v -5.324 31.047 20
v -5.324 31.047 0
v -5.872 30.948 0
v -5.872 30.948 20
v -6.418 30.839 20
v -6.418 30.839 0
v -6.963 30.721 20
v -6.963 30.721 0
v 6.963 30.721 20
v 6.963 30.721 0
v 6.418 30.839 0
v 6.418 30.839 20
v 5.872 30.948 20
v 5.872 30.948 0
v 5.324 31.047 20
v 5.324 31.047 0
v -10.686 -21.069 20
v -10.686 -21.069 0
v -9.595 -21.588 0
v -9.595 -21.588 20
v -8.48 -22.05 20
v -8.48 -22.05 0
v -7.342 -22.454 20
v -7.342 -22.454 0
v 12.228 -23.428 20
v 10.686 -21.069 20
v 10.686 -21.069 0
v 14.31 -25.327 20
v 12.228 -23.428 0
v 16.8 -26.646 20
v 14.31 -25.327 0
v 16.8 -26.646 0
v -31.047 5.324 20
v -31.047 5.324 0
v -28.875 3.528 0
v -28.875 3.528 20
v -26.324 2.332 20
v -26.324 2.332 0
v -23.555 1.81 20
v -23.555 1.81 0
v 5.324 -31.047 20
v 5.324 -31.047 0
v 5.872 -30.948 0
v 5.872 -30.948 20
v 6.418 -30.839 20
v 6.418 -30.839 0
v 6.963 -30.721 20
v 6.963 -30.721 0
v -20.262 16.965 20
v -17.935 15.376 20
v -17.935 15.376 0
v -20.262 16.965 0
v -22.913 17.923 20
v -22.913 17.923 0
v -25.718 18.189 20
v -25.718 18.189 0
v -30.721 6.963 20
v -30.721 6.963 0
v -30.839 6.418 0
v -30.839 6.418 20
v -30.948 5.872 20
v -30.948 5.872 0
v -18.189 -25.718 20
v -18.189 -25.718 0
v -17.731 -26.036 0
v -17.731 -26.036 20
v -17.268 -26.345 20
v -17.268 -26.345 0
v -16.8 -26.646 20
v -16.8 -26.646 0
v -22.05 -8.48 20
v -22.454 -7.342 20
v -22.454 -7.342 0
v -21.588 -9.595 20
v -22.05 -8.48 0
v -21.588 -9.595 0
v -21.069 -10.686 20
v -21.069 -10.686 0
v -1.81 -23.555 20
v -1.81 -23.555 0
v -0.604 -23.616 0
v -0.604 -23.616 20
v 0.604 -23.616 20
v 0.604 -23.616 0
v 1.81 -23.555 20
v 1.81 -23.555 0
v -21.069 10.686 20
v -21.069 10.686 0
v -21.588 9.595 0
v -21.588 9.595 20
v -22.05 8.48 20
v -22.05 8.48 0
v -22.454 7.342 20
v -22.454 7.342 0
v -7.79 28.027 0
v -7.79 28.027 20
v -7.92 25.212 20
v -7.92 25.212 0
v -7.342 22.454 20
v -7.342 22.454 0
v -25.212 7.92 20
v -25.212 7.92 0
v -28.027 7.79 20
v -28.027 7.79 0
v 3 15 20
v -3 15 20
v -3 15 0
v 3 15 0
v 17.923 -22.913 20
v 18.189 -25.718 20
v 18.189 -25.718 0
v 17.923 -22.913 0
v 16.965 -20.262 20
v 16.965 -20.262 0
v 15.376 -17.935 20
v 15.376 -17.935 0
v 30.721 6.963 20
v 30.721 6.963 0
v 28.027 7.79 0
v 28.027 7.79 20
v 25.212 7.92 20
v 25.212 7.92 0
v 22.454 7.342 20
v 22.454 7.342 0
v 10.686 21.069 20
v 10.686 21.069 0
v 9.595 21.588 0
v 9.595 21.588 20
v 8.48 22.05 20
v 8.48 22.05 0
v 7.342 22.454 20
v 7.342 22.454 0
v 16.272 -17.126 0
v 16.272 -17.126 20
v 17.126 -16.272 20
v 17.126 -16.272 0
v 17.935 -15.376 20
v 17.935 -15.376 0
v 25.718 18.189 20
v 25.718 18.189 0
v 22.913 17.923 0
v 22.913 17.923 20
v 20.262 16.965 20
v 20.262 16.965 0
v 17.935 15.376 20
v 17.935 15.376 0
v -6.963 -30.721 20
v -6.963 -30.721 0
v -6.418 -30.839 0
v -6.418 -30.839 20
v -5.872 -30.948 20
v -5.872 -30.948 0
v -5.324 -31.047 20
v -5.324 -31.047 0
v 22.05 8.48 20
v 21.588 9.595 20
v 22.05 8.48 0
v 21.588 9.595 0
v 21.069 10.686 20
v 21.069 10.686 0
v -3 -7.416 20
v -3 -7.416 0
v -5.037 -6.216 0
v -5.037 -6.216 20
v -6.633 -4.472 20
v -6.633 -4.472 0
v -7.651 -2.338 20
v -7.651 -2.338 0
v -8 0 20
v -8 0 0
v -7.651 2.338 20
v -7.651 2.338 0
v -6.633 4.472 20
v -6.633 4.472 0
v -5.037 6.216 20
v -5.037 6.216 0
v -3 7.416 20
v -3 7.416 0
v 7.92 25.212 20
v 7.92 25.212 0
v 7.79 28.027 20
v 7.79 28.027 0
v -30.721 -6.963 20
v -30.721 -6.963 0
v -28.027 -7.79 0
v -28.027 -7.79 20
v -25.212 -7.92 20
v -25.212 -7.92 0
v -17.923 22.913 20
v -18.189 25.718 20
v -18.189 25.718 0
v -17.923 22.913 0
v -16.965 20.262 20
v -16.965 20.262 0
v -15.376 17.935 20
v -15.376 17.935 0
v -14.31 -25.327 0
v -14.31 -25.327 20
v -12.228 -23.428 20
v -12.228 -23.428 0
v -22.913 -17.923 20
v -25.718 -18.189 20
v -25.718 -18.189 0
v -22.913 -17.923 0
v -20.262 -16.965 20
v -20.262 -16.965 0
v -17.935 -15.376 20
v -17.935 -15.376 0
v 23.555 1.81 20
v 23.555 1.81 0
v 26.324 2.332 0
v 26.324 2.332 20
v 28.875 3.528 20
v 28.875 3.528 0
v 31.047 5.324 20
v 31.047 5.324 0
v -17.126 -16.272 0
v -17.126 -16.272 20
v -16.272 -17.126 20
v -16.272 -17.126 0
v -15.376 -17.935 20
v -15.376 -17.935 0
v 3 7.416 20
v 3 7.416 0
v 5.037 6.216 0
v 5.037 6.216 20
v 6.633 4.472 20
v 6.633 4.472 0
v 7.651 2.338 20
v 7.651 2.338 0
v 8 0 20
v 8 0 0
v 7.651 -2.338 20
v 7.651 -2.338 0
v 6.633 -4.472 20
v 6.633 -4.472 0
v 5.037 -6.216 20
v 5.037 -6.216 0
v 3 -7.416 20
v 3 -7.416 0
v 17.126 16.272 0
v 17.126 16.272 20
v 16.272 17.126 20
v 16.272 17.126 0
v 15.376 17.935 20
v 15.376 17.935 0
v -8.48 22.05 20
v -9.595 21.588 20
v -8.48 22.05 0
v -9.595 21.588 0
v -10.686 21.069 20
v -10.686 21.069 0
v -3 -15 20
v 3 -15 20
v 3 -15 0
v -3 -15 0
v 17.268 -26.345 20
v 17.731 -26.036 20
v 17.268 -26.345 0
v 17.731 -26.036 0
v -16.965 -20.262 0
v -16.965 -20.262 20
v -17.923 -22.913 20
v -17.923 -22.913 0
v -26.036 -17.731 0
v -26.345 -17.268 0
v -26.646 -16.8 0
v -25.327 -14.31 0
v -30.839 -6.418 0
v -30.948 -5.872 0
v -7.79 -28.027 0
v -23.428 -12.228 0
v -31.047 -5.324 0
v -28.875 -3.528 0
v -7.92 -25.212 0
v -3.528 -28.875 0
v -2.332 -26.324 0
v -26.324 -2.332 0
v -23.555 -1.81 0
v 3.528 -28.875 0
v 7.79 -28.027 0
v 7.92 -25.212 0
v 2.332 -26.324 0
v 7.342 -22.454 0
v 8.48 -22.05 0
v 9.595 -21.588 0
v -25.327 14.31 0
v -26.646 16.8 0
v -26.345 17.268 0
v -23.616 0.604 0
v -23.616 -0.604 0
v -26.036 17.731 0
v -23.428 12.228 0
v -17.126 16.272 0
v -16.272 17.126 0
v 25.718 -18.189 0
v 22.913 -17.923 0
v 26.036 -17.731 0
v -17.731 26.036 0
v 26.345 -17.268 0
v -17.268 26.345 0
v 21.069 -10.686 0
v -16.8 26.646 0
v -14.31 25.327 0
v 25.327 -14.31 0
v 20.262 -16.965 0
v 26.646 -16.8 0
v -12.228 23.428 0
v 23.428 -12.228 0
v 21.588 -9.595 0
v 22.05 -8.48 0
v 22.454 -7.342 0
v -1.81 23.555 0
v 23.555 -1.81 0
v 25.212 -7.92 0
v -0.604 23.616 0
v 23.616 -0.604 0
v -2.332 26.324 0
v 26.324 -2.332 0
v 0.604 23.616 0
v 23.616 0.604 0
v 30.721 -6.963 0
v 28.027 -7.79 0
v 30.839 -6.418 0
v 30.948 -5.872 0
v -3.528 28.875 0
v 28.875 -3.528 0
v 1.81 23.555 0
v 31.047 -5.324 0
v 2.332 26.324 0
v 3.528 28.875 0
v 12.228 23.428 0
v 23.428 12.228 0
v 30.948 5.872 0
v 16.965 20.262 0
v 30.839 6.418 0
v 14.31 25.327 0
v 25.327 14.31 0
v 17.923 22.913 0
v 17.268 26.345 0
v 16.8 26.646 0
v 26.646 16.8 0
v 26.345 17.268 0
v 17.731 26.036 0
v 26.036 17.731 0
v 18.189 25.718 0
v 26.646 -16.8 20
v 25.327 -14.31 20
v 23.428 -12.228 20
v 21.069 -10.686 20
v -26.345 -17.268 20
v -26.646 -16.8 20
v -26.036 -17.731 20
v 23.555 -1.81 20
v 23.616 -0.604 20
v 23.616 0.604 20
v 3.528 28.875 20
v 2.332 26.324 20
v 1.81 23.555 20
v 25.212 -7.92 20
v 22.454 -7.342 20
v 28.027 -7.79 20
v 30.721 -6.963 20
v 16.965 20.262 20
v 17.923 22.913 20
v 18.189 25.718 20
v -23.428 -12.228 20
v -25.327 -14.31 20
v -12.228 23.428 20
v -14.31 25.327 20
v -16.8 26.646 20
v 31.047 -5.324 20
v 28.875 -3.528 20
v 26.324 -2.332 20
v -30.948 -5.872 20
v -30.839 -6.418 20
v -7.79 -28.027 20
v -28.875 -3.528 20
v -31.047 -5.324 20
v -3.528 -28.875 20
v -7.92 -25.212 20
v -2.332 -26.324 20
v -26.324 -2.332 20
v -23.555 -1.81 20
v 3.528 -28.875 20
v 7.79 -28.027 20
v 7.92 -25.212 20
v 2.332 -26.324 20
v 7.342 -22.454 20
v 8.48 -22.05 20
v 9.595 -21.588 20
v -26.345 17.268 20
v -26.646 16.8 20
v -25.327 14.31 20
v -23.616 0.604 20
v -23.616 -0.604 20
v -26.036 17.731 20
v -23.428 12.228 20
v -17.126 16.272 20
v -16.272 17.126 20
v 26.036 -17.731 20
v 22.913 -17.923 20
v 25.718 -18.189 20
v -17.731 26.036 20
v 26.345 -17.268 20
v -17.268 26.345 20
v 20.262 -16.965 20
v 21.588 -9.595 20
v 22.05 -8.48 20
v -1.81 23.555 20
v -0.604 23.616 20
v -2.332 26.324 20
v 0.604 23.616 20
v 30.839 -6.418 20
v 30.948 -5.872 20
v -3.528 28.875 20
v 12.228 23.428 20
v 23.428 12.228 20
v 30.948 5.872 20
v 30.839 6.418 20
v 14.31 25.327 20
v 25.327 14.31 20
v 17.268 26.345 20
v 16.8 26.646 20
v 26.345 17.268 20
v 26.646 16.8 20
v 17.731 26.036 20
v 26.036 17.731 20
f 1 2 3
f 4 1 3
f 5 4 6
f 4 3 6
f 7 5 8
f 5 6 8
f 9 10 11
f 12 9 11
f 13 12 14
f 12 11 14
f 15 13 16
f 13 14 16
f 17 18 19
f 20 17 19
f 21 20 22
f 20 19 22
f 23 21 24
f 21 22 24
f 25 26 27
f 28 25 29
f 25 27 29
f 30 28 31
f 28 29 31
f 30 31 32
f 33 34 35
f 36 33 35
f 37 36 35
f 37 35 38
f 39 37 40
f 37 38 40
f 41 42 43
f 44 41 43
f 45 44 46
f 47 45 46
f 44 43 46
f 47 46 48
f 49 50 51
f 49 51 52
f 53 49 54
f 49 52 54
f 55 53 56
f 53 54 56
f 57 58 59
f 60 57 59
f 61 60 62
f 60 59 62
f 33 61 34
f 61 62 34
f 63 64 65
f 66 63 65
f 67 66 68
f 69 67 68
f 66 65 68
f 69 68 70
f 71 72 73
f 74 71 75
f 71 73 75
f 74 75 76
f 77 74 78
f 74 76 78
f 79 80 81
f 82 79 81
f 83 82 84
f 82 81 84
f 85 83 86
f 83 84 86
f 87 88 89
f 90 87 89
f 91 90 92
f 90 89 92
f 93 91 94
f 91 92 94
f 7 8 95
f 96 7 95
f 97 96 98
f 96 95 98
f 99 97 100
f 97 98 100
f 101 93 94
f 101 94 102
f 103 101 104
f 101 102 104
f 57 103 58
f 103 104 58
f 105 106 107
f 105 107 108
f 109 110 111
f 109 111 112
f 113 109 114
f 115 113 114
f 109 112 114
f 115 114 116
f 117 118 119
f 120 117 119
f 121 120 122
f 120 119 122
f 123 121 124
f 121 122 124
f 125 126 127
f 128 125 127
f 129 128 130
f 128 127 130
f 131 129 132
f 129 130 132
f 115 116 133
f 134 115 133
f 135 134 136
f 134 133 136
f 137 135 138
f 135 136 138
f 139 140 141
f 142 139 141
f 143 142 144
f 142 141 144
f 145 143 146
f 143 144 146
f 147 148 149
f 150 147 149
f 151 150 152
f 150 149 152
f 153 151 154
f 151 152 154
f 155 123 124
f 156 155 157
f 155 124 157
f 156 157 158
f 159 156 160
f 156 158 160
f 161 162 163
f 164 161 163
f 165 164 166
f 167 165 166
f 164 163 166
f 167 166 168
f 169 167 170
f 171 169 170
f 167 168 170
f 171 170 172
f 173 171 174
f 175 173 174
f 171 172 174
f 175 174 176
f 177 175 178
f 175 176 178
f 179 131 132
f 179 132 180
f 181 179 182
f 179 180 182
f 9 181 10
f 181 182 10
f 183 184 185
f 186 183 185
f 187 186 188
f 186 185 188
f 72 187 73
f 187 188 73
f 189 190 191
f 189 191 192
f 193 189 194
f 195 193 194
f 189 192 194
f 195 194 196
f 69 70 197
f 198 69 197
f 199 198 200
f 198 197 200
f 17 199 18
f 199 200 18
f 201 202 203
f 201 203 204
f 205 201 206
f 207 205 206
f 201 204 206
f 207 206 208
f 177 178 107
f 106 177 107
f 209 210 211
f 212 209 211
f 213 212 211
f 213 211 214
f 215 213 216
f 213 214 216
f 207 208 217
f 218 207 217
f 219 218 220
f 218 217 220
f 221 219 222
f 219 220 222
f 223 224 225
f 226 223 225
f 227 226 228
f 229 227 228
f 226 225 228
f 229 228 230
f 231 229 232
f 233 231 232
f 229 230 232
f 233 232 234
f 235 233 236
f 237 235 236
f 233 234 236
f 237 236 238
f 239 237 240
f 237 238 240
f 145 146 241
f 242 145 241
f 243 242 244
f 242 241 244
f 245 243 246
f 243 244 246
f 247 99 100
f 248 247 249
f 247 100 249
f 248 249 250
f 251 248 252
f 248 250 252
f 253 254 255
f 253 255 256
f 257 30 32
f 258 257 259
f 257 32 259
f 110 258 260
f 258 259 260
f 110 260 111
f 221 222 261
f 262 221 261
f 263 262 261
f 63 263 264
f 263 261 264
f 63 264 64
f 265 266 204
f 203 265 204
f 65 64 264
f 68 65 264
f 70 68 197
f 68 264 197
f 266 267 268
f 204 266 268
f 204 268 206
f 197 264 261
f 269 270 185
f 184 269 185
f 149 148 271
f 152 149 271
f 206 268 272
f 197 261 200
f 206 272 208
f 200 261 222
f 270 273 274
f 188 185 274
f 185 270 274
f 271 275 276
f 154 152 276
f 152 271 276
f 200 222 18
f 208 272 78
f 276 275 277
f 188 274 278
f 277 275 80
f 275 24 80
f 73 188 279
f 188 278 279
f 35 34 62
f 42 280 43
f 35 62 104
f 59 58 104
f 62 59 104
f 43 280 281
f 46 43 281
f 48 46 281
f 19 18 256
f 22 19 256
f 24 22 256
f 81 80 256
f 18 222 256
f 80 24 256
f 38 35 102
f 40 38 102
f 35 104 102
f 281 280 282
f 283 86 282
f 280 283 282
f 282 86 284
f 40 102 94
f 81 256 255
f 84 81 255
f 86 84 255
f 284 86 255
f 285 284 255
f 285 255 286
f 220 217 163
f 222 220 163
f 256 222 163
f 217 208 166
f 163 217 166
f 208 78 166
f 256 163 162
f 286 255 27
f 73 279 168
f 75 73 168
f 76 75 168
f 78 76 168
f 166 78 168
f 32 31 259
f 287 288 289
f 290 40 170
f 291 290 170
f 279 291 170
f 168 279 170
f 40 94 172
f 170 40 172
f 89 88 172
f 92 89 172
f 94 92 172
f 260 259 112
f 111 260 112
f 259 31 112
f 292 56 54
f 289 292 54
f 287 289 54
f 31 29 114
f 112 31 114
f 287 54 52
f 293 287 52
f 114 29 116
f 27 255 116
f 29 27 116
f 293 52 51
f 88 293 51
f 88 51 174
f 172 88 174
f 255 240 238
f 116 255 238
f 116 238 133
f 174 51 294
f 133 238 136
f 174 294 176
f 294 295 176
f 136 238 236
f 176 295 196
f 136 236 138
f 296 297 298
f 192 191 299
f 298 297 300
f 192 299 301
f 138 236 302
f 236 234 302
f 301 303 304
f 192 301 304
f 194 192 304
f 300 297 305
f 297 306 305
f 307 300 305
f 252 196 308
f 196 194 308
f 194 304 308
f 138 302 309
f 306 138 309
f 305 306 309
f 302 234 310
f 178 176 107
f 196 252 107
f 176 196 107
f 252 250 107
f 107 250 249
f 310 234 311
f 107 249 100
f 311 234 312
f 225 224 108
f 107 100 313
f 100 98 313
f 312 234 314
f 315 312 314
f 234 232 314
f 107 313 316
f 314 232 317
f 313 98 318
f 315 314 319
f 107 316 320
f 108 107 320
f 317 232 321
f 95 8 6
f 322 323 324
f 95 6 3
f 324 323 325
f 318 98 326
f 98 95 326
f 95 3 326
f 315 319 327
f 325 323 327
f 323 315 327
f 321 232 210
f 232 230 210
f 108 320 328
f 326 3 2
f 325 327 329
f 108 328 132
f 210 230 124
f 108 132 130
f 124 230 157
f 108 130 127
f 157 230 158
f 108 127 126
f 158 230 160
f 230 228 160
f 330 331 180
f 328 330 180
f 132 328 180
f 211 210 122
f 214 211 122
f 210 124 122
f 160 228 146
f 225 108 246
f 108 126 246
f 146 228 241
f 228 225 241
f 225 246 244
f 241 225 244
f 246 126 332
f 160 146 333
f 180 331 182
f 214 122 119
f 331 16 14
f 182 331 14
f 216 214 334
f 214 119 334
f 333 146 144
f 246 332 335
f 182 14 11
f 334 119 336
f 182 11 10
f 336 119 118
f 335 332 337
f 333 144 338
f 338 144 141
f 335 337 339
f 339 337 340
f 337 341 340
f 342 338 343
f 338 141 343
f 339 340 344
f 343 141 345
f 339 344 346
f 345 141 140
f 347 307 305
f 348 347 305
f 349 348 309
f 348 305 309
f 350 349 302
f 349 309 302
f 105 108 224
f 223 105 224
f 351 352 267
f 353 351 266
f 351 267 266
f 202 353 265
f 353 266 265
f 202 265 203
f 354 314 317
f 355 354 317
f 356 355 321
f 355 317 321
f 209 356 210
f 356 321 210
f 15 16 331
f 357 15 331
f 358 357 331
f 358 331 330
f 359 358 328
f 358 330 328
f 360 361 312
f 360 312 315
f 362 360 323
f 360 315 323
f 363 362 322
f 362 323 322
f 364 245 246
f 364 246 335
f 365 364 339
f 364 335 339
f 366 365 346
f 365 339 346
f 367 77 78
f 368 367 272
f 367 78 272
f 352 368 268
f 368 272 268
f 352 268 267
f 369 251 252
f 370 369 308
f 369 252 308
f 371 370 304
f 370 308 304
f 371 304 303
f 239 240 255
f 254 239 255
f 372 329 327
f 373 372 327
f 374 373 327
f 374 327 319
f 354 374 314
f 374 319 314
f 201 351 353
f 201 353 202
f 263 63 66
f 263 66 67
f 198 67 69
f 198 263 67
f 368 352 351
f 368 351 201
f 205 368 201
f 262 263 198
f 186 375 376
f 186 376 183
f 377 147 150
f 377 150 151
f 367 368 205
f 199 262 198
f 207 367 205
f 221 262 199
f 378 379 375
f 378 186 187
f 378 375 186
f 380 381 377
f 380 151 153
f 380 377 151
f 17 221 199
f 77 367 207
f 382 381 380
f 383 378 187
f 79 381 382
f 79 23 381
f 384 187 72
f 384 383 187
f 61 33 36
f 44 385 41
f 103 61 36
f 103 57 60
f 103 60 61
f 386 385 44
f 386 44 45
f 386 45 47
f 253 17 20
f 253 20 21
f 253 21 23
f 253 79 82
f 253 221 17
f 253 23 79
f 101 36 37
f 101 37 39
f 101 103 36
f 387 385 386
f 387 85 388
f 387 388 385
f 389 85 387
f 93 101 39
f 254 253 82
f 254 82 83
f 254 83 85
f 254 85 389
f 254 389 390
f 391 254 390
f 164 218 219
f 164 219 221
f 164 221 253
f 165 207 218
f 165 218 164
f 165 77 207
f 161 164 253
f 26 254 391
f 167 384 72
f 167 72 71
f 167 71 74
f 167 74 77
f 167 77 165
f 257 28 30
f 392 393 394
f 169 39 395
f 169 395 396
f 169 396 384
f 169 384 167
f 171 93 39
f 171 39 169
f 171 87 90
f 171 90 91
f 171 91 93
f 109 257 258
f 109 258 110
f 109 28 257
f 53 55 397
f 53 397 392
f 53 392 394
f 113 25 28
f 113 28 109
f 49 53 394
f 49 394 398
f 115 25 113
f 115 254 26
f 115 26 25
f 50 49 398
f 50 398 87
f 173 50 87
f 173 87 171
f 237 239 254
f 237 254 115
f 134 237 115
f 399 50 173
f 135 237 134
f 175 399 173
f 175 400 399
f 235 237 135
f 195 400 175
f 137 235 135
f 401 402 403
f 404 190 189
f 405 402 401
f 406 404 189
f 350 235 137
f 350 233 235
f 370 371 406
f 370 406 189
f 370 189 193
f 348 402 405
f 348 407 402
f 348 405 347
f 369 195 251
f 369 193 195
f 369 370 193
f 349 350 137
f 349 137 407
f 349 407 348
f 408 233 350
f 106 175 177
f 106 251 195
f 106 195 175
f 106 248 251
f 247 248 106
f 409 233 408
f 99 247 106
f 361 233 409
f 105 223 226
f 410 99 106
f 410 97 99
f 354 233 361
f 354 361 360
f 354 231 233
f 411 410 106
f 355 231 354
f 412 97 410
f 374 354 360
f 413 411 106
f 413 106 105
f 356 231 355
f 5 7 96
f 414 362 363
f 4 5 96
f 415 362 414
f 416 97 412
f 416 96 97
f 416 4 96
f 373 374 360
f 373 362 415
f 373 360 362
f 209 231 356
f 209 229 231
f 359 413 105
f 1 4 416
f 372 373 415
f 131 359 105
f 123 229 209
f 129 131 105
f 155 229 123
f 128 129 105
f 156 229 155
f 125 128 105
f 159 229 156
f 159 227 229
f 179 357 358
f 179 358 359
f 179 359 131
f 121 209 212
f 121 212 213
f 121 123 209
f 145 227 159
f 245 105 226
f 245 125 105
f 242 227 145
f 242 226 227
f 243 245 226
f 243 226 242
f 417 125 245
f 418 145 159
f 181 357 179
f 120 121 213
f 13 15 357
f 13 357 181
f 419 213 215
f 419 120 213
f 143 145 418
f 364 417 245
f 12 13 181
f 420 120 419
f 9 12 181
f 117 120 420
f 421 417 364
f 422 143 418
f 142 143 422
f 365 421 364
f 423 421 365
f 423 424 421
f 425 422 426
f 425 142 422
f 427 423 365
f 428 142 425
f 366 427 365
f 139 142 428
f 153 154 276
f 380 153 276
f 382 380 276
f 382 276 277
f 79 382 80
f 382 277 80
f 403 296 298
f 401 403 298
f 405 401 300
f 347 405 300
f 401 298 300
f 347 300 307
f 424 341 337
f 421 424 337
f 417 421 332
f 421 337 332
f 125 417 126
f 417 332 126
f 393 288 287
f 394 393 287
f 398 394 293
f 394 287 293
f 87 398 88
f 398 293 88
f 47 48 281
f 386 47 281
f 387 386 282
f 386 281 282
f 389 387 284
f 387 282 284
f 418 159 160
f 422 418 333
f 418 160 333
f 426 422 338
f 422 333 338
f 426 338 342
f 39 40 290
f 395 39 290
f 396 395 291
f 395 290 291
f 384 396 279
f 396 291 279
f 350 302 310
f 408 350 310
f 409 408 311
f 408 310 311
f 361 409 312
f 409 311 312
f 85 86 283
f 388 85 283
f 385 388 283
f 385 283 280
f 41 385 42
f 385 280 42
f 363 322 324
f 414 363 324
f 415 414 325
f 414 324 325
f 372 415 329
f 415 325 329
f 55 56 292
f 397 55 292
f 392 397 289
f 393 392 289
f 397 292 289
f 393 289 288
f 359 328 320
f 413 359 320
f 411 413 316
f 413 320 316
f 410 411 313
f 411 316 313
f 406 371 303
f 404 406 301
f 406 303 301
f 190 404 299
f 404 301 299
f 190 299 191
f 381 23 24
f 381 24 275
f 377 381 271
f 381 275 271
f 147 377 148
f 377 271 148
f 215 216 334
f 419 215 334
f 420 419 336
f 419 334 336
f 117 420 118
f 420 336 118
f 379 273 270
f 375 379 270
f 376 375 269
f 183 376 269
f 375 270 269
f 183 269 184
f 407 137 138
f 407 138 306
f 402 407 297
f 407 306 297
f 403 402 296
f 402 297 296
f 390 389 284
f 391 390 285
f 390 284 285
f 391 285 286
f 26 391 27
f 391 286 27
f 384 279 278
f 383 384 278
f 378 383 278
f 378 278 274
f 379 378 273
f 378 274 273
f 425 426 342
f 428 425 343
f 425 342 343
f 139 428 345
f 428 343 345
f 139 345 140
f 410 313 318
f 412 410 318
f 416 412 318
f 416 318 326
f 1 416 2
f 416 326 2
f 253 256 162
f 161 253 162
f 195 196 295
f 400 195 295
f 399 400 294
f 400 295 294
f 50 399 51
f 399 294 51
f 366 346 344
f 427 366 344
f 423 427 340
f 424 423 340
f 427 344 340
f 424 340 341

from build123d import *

# Parameters (mm, degrees)
BOSS_EXTRUDE1_DEPTH = 20


with BuildPart() as part:
    # Sketch1 → Boss-Extrude1 (new body)
    with BuildSketch(Plane.XY):
        with BuildLine():
            ThreePointArc((-31.046882255, 5.323636185), (-27.637166731, 2.849349951), (-23.55457664, 1.809777696))
            ThreePointArc((-23.55457664, 1.809777696), (-23.624, 0), (-23.55457664, -1.809777696))
            ThreePointArc((-23.55457664, -1.809777696), (-27.637166731, -2.849349951), (-31.046882255, -5.323636185))
            ThreePointArc((-31.046882255, -5.323636185), (-30.894736333, -6.145345143), (-30.720846432, -6.962728956))
            ThreePointArc((-30.720846432, -6.962728956), (-26.623811699, -7.943829725), (-22.454163195, -7.341929665))
            ThreePointArc((-22.454163195, -7.341929665), (-21.825730076, -9.040513406), (-21.069019314, -10.685962808))
            ThreePointArc((-21.069019314, -10.685962808), (-24.44301366, -13.208741926), (-26.646311696, -16.799525975))
            ThreePointArc((-26.646311696, -16.799525975), (-26.191292788, -17.50046234), (-25.717840224, -18.189081731))
            ThreePointArc((-25.717840224, -18.189081731), (-21.55722268, -17.527633336), (-17.935306952, -15.375894789))
            ThreePointArc((-17.935306952, -15.375894789), (-16.704690599, -16.704690599), (-15.375894789, -17.935306951))
            ThreePointArc((-15.375894789, -17.935306951), (-17.527633336, -21.55722268), (-18.189081731, -25.717840224))
            ThreePointArc((-18.189081731, -25.717840224), (-17.50046234, -26.191292788), (-16.799525975, -26.646311696))
            ThreePointArc((-16.799525975, -26.646311696), (-13.208741926, -24.44301366), (-10.685962808, -21.069019314))
            ThreePointArc((-10.685962808, -21.069019314), (-9.040513406, -21.825730076), (-7.341929665, -22.454163195))
            ThreePointArc((-7.341929665, -22.454163195), (-7.943829725, -26.623811699), (-6.962728956, -30.720846432))
            ThreePointArc((-6.962728956, -30.720846432), (-6.145345144, -30.894736333), (-5.323636185, -31.046882255))
            ThreePointArc((-5.323636185, -31.046882255), (-2.849349951, -27.637166731), (-1.809777696, -23.55457664))
            ThreePointArc((-1.809777696, -23.55457664), (0, -23.624), (1.809777696, -23.55457664))
            ThreePointArc((1.809777696, -23.55457664), (2.849349951, -27.637166731), (5.323636185, -31.046882255))
            ThreePointArc((5.323636185, -31.046882255), (6.145345143, -30.894736333), (6.962728956, -30.720846432))
            ThreePointArc((6.962728956, -30.720846432), (7.943829725, -26.623811699), (7.341929665, -22.454163195))
            ThreePointArc((7.341929665, -22.454163195), (9.040513406, -21.825730076), (10.685962808, -21.069019314))
            ThreePointArc((10.685962808, -21.069019314), (13.208741926, -24.44301366), (16.799525975, -26.646311696))
            ThreePointArc((16.799525975, -26.646311696), (17.50046234, -26.191292788), (18.189081731, -25.717840224))
            ThreePointArc((18.189081731, -25.717840224), (17.527633336, -21.55722268), (15.375894789, -17.935306952))
            ThreePointArc((15.375894789, -17.935306952), (16.704690599, -16.704690599), (17.935306952, -15.375894789))
            ThreePointArc((17.935306952, -15.375894789), (21.55722268, -17.527633336), (25.717840224, -18.189081731))
            ThreePointArc((25.717840224, -18.189081731), (26.191292788, -17.50046234), (26.646311696, -16.799525975))
            ThreePointArc((26.646311696, -16.799525975), (24.44301366, -13.208741926), (21.069019314, -10.685962808))
            ThreePointArc((21.069019314, -10.685962808), (21.825730076, -9.040513406), (22.454163195, -7.341929665))
            ThreePointArc((22.454163195, -7.341929665), (26.623811699, -7.943829725), (30.720846432, -6.962728956))
            ThreePointArc((30.720846432, -6.962728956), (30.894736333, -6.145345144), (31.046882255, -5.323636185))
            ThreePointArc((31.046882255, -5.323636185), (27.637166731, -2.849349951), (23.55457664, -1.809777696))
            ThreePointArc((23.55457664, -1.809777696), (23.624, 0), (23.55457664, 1.809777696))
            ThreePointArc((23.55457664, 1.809777696), (27.637166731, 2.849349951), (31.046882255, 5.323636185))
            ThreePointArc((31.046882255, 5.323636185), (30.894736333, 6.145345144), (30.720846432, 6.962728956))
            ThreePointArc((30.720846432, 6.962728956), (26.623811699, 7.943829725), (22.454163195, 7.341929665))
            ThreePointArc((22.454163195, 7.341929665), (21.825730076, 9.040513406), (21.069019314, 10.685962808))
            ThreePointArc((21.069019314, 10.685962808), (24.44301366, 13.208741926), (26.646311696, 16.799525975))
            ThreePointArc((26.646311696, 16.799525975), (26.191292788, 17.50046234), (25.717840224, 18.189081731))
            ThreePointArc((25.717840224, 18.189081731), (21.55722268, 17.527633336), (17.935306951, 15.375894789))
            ThreePointArc((17.935306951, 15.375894789), (16.704690599, 16.704690599), (15.375894789, 17.935306952))
            ThreePointArc((15.375894789, 17.935306952), (17.527633336, 21.55722268), (18.189081731, 25.717840224))
            ThreePointArc((18.189081731, 25.717840224), (17.50046234, 26.191292788), (16.799525975, 26.646311696))
            ThreePointArc((16.799525975, 26.646311696), (13.208741926, 24.44301366), (10.685962808, 21.069019314))
            ThreePointArc((10.685962808, 21.069019314), (9.040513406, 21.825730076), (7.341929665, 22.454163195))
            ThreePointArc((7.341929665, 22.454163195), (7.943829725, 26.623811699), (6.962728956, 30.720846432))
            ThreePointArc((6.962728956, 30.720846432), (6.145345144, 30.894736333), (5.323636185, 31.046882255))
            ThreePointArc((5.323636185, 31.046882255), (2.849349951, 27.637166731), (1.809777696, 23.55457664))
            ThreePointArc((1.809777696, 23.55457664), (0, 23.624), (-1.809777696, 23.55457664))
            ThreePointArc((-1.809777696, 23.55457664), (-2.849349951, 27.637166731), (-5.323636185, 31.046882255))
            ThreePointArc((-5.323636185, 31.046882255), (-6.145345144, 30.894736333), (-6.962728956, 30.720846432))
            ThreePointArc((-6.962728956, 30.720846432), (-7.943829725, 26.623811699), (-7.341929665, 22.454163195))
            ThreePointArc((-7.341929665, 22.454163195), (-9.040513406, 21.825730076), (-10.685962808, 21.069019314))
            ThreePointArc((-10.685962808, 21.069019314), (-13.208741926, 24.44301366), (-16.799525975, 26.646311696))
            ThreePointArc((-16.799525975, 26.646311696), (-17.50046234, 26.191292788), (-18.189081731, 25.717840224))
            ThreePointArc((-18.189081731, 25.717840224), (-17.527633336, 21.55722268), (-15.375894789, 17.935306952))
            ThreePointArc((-15.375894789, 17.935306952), (-16.704690599, 16.704690599), (-17.935306952, 15.375894789))
            ThreePointArc((-17.935306952, 15.375894789), (-21.55722268, 17.527633336), (-25.717840224, 18.189081731))
            ThreePointArc((-25.717840224, 18.189081731), (-26.191292788, 17.50046234), (-26.646311696, 16.799525975))
            ThreePointArc((-26.646311696, 16.799525975), (-24.44301366, 13.208741926), (-21.069019314, 10.685962808))
            ThreePointArc((-21.069019314, 10.685962808), (-21.825730076, 9.040513406), (-22.454163195, 7.341929665))
            ThreePointArc((-22.454163195, 7.341929665), (-26.623811699, 7.943829725), (-30.720846432, 6.962728956))
            ThreePointArc((-30.720846432, 6.962728956), (-30.894736333, 6.145345144), (-31.046882255, 5.323636185))
        make_face()
        with BuildLine():
            Line((-3, 15), (3, 15))
            Line((3, 15), (3, 7.416198487))
            ThreePointArc((3, 7.416198487), (8, 0), (3, -7.416198487))
            Line((3, -7.416198487), (3, -15))
            Line((3, -15), (-3, -15))
            Line((-3, -15), (-3, -7.416198487))
            ThreePointArc((-3, -7.416198487), (-8, 0), (-3, 7.416198487))
            Line((-3, 7.416198487), (-3, 15))
        make_face(mode=Mode.SUBTRACT)
    extrude(amount=BOSS_EXTRUDE1_DEPTH)


solid = part.part
